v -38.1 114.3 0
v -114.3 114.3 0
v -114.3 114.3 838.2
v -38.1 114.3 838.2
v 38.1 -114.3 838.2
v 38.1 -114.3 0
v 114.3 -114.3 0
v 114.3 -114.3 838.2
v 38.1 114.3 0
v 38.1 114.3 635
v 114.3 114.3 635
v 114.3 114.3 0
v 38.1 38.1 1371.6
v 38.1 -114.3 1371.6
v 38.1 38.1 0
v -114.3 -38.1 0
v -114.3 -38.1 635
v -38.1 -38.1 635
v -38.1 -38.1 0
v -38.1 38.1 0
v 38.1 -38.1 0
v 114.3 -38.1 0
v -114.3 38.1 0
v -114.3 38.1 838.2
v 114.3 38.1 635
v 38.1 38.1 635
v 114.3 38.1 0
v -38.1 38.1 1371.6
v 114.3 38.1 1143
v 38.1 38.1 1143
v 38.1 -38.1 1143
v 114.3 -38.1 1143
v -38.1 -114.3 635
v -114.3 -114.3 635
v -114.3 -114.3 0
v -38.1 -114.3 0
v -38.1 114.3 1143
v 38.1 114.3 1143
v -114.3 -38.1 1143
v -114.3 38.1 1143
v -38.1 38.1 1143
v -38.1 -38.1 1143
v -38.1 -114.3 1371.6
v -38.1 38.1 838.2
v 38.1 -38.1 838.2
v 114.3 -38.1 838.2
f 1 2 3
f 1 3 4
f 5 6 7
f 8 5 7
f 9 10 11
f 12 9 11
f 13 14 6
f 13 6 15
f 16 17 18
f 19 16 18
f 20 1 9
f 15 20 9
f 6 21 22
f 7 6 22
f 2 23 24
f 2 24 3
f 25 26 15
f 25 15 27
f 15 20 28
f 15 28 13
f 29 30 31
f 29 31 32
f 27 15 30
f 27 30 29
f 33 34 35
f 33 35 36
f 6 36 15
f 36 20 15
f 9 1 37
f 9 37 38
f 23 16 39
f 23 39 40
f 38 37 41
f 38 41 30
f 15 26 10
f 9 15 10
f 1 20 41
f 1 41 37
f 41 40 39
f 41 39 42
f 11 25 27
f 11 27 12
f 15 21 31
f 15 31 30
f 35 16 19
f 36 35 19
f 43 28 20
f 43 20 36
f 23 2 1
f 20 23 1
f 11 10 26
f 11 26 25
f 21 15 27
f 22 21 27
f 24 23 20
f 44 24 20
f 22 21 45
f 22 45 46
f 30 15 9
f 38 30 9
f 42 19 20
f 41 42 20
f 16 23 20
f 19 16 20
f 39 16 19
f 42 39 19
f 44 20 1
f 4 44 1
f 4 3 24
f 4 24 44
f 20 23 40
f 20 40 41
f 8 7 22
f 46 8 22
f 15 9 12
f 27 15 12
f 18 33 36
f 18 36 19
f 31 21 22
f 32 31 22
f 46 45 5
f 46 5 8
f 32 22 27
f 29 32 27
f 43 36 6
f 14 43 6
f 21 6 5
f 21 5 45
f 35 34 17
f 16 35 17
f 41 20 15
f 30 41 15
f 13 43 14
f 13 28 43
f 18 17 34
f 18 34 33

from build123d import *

# Parameters (mm, degrees)
F0_W     = 76.2
F0_H     = 76.2
F1_DEPTH = 635
F2_W     = 76.2
F2_H     = 76.2
F3_DEPTH = 838.2
F4_W     = 76.2
F4_H     = 76.2
F5_DEPTH = 1143
F6_W     = 76.2
F6_H     = 76.2
F7_DEPTH = 1371.6


with BuildPart() as f1:
    # F0 (on Top) → F1 (new body)
    with BuildSketch(Plane.XY):
        with Locations((76.2, 76.2)):
            Rectangle(F0_W, F0_H)
        with Locations((-76.2, -76.2)):
            Rectangle(F0_W, F0_H)
    extrude(amount=F1_DEPTH)


with BuildPart() as f3:
    # F2 (on Top) → F3 (new body)
    with BuildSketch(Plane.XY):
        with Locations((-76.2, 76.2)):
            Rectangle(F2_W, F2_H)
        with Locations((76.2, -76.2)):
            Rectangle(F2_W, F2_H)
    extrude(amount=F3_DEPTH)


with BuildPart() as f5:
    # F4 (on Top) → F5 (new body)
    with BuildSketch(Plane.XY):
        with Locations((76.2, 0)):
            Rectangle(F4_W, F4_H)
        with Locations((-76.2, 0)):
            Rectangle(F4_W, F4_H)
        with Locations((0, 76.2)):
            Rectangle(F4_W, F4_H)
    extrude(amount=F5_DEPTH)


with BuildPart() as f7:
    # F6 (on Top) → F7 (new body)
    with BuildSketch(Plane.XY):
        with Locations((0, -76.2)):
            Rectangle(F6_W, F6_H)
        Rectangle(F6_W, F6_H)
    extrude(amount=F7_DEPTH)


solid = Compound([f1.part, f3.part, f5.part, f7.part])
